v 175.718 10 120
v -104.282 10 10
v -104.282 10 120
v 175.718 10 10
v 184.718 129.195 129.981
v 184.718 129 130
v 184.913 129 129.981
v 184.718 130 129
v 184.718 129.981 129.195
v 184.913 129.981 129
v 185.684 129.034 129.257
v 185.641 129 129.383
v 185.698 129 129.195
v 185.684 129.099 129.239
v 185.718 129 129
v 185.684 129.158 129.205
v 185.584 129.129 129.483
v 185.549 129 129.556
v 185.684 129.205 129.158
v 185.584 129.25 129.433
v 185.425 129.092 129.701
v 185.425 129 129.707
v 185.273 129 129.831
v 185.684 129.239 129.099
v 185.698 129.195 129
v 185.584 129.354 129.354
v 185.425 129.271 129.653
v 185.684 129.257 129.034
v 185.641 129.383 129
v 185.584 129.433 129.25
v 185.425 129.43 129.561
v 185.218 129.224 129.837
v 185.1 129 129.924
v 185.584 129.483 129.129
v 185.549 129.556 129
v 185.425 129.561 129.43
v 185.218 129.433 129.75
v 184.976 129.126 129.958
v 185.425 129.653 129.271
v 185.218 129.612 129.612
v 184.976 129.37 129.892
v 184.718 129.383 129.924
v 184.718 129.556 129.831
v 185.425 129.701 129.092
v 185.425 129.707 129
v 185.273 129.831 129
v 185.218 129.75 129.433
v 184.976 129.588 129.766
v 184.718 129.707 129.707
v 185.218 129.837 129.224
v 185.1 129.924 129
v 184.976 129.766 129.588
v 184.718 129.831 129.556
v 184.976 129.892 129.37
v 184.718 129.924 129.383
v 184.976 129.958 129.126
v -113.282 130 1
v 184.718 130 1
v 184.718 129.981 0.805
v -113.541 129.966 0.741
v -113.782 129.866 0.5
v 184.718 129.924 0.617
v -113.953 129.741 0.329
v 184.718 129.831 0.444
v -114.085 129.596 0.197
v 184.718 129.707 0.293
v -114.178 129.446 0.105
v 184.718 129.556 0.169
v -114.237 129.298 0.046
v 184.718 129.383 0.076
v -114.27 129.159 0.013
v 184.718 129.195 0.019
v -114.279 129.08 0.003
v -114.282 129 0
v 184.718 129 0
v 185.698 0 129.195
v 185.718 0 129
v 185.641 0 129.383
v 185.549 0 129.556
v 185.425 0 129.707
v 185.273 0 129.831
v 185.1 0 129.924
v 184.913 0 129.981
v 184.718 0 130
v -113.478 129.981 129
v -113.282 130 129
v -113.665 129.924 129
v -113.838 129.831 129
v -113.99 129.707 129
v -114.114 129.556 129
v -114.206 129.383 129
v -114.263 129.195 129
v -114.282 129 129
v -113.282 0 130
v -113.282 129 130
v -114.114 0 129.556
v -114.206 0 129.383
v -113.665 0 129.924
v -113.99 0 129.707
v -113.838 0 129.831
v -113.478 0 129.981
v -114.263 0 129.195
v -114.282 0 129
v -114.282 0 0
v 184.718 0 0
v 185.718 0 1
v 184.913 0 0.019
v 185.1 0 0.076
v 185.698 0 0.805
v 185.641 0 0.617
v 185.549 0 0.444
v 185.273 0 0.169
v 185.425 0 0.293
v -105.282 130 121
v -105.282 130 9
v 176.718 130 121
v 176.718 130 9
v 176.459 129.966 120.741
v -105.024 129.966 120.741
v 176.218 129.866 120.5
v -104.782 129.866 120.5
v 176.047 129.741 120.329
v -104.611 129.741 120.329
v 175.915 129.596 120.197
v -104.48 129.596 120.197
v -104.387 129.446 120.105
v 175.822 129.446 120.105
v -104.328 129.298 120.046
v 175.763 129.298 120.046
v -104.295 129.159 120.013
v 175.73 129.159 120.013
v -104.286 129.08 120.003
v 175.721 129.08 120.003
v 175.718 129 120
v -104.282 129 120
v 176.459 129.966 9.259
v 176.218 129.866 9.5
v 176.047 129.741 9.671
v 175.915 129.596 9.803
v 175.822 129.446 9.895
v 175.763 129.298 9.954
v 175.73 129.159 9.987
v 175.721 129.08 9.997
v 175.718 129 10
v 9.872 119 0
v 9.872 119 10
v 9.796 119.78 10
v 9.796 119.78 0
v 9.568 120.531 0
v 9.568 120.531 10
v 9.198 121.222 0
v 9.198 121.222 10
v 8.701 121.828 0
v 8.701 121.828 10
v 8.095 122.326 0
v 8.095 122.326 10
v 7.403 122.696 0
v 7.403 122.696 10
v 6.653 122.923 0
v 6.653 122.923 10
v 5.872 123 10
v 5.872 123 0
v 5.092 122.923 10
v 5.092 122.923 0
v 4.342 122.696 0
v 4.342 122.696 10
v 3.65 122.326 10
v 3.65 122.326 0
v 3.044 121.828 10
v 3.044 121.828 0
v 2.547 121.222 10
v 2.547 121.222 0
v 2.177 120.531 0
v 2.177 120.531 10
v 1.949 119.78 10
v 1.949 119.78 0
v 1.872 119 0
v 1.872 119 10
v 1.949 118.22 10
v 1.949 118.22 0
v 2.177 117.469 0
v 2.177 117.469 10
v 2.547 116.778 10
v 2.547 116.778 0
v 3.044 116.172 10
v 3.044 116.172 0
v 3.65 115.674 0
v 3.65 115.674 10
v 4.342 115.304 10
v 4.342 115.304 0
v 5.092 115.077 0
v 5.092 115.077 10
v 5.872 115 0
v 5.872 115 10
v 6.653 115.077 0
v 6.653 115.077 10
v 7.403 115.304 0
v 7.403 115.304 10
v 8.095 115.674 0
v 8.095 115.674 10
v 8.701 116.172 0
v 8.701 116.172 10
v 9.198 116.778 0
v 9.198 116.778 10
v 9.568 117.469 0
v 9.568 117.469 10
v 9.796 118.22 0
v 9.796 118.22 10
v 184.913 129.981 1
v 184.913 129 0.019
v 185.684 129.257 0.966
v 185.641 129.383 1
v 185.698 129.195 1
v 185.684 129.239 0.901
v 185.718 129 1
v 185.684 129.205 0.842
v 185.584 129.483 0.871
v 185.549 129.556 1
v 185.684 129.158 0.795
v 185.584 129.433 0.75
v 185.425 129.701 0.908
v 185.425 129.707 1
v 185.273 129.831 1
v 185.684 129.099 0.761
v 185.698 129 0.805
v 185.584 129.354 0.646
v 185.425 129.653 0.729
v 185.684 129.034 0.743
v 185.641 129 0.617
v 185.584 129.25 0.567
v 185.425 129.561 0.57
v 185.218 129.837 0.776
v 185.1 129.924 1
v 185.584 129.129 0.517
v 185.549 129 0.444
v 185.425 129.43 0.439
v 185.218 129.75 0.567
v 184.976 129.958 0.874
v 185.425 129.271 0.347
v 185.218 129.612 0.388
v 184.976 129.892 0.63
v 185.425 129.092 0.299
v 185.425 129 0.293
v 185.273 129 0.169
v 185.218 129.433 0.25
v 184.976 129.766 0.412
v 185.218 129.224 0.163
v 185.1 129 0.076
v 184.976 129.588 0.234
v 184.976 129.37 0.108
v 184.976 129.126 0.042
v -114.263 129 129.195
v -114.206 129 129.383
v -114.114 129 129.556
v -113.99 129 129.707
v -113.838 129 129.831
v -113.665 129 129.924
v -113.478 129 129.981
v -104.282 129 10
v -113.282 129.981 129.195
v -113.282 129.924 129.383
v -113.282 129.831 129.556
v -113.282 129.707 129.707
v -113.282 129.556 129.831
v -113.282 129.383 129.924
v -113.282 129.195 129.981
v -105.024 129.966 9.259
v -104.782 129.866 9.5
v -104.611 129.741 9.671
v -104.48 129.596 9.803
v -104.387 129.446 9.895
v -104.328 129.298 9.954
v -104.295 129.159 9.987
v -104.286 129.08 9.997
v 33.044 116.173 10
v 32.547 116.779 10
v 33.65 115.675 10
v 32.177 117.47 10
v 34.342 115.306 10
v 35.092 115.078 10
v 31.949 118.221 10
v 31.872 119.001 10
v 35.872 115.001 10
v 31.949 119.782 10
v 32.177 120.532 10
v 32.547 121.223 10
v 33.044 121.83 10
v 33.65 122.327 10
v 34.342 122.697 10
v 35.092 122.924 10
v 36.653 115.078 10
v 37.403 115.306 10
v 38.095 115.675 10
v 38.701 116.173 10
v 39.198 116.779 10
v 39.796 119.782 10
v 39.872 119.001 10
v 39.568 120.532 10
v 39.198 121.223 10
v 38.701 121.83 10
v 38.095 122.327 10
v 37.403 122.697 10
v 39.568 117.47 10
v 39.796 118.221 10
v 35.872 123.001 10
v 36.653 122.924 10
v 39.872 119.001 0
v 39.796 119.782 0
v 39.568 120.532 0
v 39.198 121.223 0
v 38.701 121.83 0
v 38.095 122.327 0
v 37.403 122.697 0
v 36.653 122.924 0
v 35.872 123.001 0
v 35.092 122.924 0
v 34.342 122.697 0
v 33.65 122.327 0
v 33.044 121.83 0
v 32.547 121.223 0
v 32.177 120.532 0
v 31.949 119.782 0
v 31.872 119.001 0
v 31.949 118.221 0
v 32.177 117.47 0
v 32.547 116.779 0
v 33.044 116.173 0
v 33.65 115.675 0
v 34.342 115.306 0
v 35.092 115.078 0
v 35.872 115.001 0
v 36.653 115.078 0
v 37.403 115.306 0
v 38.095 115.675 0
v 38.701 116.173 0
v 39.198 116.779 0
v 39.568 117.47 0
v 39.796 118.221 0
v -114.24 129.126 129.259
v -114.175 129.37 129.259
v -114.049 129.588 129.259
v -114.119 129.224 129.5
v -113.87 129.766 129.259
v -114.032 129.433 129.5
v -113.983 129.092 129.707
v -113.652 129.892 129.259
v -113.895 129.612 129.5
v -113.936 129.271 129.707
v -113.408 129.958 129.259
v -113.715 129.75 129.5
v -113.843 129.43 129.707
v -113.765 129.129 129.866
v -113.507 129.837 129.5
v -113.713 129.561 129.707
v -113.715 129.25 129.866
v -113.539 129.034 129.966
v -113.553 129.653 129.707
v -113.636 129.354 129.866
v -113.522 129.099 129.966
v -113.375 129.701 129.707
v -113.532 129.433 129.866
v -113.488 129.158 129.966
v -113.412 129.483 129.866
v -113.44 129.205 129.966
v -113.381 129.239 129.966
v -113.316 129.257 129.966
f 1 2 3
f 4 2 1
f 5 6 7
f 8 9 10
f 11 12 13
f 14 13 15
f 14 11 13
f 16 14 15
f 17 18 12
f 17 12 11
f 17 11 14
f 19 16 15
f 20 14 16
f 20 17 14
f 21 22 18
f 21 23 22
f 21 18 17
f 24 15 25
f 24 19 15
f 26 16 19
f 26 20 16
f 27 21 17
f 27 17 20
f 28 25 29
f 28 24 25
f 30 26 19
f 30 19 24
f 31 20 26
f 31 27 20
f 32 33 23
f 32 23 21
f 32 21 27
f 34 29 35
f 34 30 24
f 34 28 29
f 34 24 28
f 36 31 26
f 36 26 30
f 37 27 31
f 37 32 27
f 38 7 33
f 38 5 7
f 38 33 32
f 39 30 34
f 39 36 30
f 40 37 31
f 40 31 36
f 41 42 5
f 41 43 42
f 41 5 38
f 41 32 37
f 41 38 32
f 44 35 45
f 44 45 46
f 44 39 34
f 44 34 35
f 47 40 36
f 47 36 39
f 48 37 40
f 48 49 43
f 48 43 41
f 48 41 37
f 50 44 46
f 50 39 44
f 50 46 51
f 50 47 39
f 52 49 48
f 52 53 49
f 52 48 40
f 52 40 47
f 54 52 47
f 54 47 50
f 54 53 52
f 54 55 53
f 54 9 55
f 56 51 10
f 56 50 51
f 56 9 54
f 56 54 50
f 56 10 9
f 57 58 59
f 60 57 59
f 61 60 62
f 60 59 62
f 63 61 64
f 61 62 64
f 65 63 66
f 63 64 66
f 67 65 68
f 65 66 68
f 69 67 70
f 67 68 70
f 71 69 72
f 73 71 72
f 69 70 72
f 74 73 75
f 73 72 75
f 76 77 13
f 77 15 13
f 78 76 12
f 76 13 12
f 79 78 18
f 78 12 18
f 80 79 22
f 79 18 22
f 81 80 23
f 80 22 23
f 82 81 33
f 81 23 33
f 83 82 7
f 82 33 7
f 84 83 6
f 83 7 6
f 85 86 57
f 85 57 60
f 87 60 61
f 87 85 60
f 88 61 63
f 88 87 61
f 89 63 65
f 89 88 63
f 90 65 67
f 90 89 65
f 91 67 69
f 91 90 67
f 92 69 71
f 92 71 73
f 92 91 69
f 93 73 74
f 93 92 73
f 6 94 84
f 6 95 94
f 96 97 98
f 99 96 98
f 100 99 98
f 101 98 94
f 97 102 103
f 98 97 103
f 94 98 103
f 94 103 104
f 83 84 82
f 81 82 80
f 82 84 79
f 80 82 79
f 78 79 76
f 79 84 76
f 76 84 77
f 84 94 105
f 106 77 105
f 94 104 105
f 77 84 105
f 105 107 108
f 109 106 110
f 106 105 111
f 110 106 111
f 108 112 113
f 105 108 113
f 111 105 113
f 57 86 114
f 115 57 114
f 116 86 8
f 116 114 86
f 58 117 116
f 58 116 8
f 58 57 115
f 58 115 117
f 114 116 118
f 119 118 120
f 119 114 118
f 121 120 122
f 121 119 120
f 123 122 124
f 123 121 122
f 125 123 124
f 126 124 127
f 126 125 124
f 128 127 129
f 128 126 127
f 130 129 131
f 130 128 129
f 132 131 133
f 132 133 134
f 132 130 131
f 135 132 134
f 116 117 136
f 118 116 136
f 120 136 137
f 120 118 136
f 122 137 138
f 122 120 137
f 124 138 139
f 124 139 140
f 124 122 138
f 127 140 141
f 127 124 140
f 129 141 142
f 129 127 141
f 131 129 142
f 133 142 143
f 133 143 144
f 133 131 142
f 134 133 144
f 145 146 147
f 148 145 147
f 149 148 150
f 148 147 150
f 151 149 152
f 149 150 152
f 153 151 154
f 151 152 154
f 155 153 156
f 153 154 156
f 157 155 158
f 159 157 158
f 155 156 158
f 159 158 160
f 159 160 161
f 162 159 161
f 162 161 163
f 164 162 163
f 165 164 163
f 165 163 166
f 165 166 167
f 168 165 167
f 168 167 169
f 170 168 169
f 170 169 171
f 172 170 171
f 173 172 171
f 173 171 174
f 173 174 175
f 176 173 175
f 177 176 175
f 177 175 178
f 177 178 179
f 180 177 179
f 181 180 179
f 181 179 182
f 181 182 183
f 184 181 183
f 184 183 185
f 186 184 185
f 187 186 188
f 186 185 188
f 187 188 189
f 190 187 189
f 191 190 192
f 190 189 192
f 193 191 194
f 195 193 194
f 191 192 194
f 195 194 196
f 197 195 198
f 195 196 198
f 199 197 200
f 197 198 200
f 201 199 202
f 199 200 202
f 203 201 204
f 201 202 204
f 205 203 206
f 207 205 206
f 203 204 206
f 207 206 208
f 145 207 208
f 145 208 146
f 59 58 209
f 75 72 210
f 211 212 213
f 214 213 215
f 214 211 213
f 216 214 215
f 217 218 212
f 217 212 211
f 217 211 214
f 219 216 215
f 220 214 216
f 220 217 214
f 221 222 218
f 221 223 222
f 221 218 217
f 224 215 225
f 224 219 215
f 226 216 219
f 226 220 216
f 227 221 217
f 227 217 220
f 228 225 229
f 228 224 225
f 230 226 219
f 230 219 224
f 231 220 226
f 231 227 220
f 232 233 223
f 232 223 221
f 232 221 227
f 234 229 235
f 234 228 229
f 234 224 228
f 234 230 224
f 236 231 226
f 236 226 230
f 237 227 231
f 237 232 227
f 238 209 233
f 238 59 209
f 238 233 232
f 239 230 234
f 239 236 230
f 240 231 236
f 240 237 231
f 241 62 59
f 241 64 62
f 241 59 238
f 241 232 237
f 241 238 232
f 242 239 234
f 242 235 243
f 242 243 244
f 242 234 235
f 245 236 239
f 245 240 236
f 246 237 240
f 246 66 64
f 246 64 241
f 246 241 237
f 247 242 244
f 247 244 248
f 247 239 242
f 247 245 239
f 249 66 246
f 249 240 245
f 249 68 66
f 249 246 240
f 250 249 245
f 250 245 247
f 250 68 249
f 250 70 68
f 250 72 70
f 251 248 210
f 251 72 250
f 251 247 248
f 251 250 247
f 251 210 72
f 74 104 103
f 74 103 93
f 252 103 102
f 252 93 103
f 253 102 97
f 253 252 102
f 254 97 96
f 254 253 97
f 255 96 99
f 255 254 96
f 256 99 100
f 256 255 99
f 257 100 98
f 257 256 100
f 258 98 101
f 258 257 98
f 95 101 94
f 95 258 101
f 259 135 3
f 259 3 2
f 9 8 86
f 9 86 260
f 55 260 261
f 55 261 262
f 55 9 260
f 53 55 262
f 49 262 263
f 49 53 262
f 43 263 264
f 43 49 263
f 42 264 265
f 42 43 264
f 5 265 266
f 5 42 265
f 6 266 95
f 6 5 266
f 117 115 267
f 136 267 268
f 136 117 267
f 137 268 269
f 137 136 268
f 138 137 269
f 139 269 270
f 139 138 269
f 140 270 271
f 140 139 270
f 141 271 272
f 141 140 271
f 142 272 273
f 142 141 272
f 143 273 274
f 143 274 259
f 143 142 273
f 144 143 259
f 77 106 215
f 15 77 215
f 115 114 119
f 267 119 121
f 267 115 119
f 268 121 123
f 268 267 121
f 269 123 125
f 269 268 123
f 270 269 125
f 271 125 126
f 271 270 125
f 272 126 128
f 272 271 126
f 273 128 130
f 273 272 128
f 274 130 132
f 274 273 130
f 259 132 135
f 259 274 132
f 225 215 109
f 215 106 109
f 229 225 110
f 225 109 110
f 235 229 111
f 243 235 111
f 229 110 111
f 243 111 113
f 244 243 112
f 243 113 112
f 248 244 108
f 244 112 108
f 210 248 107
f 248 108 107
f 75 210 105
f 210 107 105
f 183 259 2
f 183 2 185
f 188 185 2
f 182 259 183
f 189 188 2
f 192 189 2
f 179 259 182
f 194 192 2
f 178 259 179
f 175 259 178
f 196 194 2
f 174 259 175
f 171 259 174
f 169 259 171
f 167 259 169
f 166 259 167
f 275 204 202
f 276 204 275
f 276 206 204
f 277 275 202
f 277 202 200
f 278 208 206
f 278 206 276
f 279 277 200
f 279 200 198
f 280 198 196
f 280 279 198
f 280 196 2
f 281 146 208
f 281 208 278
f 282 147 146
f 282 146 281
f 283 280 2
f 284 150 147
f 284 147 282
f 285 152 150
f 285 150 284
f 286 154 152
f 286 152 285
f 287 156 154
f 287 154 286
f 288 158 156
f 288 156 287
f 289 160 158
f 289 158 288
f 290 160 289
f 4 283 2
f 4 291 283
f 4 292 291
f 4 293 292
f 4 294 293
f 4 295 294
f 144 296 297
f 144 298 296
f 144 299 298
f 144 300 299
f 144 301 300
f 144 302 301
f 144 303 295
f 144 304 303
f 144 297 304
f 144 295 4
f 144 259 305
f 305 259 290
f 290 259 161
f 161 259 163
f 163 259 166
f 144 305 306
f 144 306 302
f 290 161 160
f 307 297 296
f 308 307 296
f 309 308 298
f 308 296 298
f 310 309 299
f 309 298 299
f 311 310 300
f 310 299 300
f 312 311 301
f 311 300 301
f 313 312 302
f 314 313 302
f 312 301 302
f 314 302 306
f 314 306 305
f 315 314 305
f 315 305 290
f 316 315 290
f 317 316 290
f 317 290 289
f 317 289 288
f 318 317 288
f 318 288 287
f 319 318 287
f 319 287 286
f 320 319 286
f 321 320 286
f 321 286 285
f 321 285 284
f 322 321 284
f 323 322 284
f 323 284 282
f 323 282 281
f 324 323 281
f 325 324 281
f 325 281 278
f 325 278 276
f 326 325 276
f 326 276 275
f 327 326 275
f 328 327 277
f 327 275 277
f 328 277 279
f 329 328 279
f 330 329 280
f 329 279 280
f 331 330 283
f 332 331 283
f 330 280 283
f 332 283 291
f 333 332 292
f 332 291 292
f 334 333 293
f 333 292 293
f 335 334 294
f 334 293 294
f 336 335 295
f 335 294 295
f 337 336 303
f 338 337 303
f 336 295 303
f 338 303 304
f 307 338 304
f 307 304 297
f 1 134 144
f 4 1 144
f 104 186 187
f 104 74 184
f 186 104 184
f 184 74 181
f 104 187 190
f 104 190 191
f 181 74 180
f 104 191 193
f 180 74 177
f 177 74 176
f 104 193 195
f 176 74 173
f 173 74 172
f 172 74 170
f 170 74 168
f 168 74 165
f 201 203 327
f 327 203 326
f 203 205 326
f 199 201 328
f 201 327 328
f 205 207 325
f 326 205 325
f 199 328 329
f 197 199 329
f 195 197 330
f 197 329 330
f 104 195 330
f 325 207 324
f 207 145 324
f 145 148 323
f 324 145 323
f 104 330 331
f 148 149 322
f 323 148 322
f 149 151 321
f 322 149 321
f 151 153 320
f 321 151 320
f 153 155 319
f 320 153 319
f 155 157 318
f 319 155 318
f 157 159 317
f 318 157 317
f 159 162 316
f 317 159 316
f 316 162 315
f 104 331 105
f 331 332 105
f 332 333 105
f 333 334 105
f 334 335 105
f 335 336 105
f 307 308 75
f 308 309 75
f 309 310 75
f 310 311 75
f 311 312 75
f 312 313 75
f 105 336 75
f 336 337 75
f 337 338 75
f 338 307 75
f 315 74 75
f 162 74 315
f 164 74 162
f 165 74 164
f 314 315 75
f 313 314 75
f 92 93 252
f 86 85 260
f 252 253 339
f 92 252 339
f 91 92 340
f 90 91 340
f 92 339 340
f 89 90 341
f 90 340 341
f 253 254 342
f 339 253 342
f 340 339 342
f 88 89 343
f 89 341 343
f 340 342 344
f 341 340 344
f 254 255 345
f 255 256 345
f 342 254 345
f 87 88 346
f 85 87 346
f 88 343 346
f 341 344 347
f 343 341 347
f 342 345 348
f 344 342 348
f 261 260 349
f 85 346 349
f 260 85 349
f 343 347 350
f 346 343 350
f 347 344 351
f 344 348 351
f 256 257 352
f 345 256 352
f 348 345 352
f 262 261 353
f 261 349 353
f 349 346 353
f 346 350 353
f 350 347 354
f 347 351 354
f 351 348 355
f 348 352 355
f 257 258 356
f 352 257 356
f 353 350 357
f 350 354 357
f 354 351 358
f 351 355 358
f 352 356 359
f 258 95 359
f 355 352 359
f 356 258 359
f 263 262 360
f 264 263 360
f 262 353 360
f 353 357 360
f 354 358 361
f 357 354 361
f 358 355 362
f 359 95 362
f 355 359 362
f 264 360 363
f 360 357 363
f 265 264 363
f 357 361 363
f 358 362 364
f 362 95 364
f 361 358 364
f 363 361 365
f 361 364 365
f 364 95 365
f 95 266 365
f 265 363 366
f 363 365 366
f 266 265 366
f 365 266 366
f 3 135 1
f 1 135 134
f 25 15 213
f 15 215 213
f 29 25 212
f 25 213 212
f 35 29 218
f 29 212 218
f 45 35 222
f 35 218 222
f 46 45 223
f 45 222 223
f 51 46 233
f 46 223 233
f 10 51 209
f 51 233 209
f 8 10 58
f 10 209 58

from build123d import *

# Parameters (mm, degrees)
ESQUISSE1_W             = 300
ESQUISSE1_H             = 130
BOSS_EXTRU_2_DEPTH      = 130
ESQUISSE6_W             = 280
ESQUISSE6_H             = 110
ENL_V_MAT_EXTRU_1_DEPTH = 120
CONG_2_R                = 1
CONG_3_R                = 1
CONG_4_R                = 1
CONG_5_R                = 1
CONG_6_R                = 1
CONG_7_R                = 1
ESQUISSE7_R             = 4
ENL_V_MAT_EXTRU_2_DEPTH = 257.497602135


with BuildPart() as part:
    # Esquisse1 → Boss.-Extru.2 (new body)
    with BuildSketch(Plane.XY):
        with Locations((35.717581023, 65)):
            Rectangle(ESQUISSE1_W, ESQUISSE1_H)
    extrude(amount=BOSS_EXTRU_2_DEPTH)

    # Esquisse6 → Enlèv. mat.-Extru.1 (cut)
    with BuildSketch(Plane(origin=(0, 130, 0), x_dir=(1, 0, 0), z_dir=(0, 1, 0))):
        with Locations((35.717581023, -65)):
            Rectangle(ESQUISSE6_W, ESQUISSE6_H)
    extrude(amount=-ENL_V_MAT_EXTRU_1_DEPTH, mode=Mode.SUBTRACT)

    # Congé2
    cong_2_edges = [part.edges().sort_by_distance(p)[0] for p in [
        (-104.282418977, 130, 65),
        (35.717581023, 130, 10),
    ]]
    fillet(cong_2_edges, radius=CONG_2_R)

    # Congé3
    cong_3_edges = [part.edges().sort_by_distance(p)[0] for p in [
        (35.217581023, 130, 120),
    ]]
    fillet(cong_3_edges, radius=CONG_3_R)

    # Congé4
    cong_4_edges = [part.edges().sort_by_distance(p)[0] for p in [
        (175.717581023, 130, 65),
    ]]
    fillet(cong_4_edges, radius=CONG_4_R)

    # Congé5
    cong_5_edges = [part.edges().sort_by_distance(p)[0] for p in [
        (35.717581023, 130, 0),
        (-114.282418977, 130, 65),
    ]]
    fillet(cong_5_edges, radius=CONG_5_R)

    # Congé6
    cong_6_edges = [part.edges().sort_by_distance(p)[0] for p in [
        (36.217581023, 130, 130),
        (-114.282418977, 64.5, 130),
        (-113.989525758, 129.707106781, 130),
    ]]
    fillet(cong_6_edges, radius=CONG_6_R)

    # Congé7
    cong_7_edges = [part.edges().sort_by_distance(p)[0] for p in [
        (185.717581023, 64.5, 130),
        (185.717581023, 64.5, 0),
        (185.717581023, 129.707106781, 0.292893219),
        (185.717581023, 130, 65),
        (185.717581023, 129.707106781, 129.707106781),
    ]]
    fillet(cong_7_edges, radius=CONG_7_R)

    # Esquisse7 → Enlèv. mat.-Extru.2 (cut, through all)
    with BuildSketch(Plane.XY.offset(10)):
        with Locations((5.872475368, 119)):
            Circle(ESQUISSE7_R)
        with Locations((35.872475344, 119.001199684)):
            Circle(ESQUISSE7_R)
    extrude(amount=-ENL_V_MAT_EXTRU_2_DEPTH, mode=Mode.SUBTRACT)


solid = part.part
